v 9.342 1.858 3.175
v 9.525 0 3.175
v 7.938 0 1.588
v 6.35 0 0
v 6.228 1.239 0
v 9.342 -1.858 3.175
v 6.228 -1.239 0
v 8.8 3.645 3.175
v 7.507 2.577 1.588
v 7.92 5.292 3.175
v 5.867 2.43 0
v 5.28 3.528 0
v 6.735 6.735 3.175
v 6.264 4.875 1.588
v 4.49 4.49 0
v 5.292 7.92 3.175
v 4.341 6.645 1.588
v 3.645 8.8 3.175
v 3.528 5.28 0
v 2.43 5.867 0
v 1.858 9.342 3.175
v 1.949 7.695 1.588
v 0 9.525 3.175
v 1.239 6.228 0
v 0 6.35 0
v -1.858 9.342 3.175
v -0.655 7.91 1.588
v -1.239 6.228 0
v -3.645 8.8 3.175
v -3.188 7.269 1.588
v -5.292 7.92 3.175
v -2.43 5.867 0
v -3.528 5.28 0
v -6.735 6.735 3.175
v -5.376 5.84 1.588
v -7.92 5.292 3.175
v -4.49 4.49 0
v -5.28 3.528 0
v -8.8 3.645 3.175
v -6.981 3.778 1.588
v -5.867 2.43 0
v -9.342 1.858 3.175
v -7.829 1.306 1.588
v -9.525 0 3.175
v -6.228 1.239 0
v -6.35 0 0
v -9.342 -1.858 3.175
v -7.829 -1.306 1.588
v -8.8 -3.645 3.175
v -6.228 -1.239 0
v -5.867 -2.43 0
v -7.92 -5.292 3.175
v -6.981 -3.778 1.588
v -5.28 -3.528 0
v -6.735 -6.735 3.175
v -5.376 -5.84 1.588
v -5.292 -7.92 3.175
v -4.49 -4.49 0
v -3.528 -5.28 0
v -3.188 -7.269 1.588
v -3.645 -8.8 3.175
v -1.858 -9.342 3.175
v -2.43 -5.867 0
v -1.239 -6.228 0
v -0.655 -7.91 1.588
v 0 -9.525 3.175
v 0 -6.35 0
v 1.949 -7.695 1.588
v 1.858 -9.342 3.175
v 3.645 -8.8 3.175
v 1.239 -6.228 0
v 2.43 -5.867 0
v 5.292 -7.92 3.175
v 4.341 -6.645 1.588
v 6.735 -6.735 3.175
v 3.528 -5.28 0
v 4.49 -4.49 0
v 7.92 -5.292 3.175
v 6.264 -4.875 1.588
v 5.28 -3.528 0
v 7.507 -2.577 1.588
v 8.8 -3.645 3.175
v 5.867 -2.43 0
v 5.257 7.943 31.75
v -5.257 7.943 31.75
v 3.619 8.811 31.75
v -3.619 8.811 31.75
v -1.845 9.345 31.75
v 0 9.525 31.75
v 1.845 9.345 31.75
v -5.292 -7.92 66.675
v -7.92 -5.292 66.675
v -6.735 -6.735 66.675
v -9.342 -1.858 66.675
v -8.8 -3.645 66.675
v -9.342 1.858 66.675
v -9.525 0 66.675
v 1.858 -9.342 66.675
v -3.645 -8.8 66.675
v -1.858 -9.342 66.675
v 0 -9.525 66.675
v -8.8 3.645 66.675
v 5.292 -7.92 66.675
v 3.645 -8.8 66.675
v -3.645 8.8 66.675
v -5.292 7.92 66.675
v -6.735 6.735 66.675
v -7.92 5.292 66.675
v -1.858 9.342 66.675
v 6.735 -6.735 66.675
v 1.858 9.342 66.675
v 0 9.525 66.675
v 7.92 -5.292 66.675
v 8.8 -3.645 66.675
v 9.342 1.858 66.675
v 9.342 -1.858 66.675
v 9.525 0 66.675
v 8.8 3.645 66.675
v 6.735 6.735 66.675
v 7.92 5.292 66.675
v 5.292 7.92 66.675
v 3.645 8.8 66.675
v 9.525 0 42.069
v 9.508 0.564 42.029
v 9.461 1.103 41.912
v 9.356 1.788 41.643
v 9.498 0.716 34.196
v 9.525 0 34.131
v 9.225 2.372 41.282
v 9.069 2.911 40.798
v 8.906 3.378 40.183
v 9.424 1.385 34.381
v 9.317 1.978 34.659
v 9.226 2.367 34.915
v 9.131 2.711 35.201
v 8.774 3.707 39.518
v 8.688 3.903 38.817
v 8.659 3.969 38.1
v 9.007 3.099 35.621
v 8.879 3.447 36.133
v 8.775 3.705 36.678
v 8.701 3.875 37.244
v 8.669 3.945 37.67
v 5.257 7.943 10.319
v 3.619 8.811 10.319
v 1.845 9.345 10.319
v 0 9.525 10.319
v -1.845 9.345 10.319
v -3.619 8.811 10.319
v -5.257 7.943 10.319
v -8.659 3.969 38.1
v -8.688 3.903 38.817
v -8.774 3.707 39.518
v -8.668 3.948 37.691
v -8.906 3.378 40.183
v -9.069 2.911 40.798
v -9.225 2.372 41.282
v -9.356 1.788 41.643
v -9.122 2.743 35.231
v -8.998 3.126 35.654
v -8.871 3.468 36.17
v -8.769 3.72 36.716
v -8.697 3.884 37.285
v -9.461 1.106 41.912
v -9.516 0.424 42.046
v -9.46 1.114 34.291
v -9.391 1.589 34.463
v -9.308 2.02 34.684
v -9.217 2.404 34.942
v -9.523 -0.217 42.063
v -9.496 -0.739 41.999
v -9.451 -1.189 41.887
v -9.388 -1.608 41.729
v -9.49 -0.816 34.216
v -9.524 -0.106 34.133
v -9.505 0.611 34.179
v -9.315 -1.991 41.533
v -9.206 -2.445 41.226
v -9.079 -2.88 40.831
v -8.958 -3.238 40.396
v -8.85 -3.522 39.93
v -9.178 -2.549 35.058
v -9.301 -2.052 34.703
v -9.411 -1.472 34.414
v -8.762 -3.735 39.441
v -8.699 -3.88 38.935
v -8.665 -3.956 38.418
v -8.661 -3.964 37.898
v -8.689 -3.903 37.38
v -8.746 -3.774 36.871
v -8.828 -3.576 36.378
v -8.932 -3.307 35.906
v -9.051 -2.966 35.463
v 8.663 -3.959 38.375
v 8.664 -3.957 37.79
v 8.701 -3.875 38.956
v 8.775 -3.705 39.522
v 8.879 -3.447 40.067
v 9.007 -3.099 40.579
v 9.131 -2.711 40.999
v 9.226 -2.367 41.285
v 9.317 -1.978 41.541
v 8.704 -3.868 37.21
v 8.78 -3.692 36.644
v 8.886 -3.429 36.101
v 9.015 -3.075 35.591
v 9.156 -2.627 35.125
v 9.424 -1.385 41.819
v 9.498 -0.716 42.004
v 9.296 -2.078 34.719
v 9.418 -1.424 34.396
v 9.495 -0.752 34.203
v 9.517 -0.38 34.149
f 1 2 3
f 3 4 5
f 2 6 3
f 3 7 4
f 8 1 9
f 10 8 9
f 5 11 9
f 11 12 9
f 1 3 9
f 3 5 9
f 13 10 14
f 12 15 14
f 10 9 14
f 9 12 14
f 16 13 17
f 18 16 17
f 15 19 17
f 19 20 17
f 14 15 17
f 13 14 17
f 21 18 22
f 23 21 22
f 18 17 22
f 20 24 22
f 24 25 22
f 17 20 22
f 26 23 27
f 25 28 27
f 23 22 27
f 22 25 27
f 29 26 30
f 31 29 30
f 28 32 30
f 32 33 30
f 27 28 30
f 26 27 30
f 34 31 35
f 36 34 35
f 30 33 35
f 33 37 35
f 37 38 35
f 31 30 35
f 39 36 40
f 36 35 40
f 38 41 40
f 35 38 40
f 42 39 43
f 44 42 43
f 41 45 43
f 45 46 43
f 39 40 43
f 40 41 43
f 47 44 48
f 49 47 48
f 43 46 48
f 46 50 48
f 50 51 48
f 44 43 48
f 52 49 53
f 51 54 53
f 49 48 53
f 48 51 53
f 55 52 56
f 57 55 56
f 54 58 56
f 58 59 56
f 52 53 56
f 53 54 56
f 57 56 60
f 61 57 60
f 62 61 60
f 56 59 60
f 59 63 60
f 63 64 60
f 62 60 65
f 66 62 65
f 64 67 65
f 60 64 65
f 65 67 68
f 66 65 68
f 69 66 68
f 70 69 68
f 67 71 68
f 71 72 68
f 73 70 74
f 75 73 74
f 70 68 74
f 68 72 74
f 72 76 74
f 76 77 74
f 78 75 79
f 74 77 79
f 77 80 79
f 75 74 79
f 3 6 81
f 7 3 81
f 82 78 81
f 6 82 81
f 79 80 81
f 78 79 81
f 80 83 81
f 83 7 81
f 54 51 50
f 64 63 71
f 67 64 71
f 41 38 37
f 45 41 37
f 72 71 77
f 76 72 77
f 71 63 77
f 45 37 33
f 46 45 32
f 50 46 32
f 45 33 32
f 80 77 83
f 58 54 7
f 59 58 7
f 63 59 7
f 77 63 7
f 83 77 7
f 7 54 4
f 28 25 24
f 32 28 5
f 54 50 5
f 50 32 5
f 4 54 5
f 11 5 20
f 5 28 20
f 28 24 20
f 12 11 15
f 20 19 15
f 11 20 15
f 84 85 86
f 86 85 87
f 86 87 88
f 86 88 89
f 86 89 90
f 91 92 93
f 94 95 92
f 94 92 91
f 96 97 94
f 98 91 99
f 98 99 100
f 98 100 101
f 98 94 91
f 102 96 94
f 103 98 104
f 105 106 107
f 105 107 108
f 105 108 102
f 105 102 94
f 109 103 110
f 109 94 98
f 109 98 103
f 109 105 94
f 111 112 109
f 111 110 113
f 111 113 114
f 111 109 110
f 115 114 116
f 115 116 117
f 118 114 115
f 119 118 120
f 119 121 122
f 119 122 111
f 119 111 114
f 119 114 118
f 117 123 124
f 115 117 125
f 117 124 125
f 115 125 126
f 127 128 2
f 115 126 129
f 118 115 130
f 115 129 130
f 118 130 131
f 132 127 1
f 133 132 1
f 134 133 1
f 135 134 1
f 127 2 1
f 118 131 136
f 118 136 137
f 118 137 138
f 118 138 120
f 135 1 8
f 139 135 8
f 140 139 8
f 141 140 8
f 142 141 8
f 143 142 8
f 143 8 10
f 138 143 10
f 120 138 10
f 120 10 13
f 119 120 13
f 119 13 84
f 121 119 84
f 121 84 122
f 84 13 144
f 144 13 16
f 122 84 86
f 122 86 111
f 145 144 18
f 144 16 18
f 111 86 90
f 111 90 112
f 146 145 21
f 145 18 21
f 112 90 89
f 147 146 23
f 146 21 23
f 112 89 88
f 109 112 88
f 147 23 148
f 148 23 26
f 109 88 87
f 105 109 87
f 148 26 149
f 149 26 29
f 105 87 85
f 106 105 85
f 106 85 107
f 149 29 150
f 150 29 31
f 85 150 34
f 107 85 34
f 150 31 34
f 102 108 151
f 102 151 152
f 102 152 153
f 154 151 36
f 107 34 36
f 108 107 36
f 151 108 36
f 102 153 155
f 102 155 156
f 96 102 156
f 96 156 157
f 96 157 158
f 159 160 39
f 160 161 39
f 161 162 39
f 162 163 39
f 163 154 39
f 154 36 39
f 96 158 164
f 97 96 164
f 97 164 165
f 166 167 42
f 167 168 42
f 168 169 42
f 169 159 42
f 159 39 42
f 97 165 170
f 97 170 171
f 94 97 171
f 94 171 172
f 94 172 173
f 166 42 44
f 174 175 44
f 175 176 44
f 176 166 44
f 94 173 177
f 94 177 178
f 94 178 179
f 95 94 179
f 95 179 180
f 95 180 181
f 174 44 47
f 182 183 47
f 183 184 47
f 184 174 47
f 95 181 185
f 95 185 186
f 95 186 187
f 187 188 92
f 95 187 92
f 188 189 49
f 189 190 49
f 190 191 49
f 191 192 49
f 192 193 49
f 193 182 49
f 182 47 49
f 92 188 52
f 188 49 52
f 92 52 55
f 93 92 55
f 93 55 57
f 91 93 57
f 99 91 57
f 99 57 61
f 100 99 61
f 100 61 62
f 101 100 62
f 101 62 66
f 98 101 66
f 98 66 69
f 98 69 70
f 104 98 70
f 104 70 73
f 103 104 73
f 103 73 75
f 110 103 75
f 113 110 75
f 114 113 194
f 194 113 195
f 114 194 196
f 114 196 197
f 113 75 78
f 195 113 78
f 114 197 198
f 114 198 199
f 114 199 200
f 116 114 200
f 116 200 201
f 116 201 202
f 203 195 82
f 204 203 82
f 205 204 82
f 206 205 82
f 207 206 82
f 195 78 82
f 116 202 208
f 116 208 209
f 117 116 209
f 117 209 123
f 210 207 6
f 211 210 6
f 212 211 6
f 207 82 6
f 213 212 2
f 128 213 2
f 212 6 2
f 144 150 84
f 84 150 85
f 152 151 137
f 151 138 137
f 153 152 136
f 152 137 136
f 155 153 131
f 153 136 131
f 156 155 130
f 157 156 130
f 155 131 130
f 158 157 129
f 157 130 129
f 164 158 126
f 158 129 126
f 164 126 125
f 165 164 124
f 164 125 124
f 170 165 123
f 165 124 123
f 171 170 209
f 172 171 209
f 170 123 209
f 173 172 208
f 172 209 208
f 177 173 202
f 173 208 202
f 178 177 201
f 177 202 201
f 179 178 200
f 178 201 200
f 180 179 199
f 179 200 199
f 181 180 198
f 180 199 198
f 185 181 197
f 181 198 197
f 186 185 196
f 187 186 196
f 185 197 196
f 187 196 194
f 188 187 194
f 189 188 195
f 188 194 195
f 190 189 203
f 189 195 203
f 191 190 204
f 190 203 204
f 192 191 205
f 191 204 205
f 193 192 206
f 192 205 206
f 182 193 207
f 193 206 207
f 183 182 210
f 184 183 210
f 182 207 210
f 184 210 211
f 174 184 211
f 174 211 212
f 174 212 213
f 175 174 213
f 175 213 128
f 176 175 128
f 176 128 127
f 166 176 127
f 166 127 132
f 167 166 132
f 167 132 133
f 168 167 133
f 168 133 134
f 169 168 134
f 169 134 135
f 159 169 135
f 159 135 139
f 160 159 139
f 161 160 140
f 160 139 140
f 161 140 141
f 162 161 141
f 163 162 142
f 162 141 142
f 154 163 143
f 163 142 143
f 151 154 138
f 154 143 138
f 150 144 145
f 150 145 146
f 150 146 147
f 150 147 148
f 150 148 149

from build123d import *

# Parameters (mm, degrees)
F0_R     = 9.525
F1_DEPTH = 66.675
F2_SIZE  = 3.175
F3_W     = 33.163304
F3_H     = 21.43125
F3_W_2   = 1.5875
F3_R     = 3.96875
F4_DEPTH = 40.839933


with BuildPart() as f1:
    # F0 (on Top) → F1 (new body)
    with BuildSketch(Plane.XY):
        Circle(F0_R)
    extrude(amount=F1_DEPTH)

    # F2
    f2_edges = [f1.edges().sort_by_distance(p)[0] for p in [
        (-9.525, 0, 0),
    ]]
    chamfer(f2_edges, length=F2_SIZE)

    # F3 (on Right) → F4 (cut, symmetric)
    with BuildSketch(Plane.YZ):
        with Locations((26.112016, 21.034375)):
            Rectangle(F3_W, F3_H)
        with Locations((8.736614, 21.034375)):
            Rectangle(F3_W_2, F3_H)
        with Locations((0, 38.1)):
            Circle(F3_R)
    extrude(amount=F4_DEPTH, both=True, mode=Mode.SUBTRACT)


solid = f1.part
